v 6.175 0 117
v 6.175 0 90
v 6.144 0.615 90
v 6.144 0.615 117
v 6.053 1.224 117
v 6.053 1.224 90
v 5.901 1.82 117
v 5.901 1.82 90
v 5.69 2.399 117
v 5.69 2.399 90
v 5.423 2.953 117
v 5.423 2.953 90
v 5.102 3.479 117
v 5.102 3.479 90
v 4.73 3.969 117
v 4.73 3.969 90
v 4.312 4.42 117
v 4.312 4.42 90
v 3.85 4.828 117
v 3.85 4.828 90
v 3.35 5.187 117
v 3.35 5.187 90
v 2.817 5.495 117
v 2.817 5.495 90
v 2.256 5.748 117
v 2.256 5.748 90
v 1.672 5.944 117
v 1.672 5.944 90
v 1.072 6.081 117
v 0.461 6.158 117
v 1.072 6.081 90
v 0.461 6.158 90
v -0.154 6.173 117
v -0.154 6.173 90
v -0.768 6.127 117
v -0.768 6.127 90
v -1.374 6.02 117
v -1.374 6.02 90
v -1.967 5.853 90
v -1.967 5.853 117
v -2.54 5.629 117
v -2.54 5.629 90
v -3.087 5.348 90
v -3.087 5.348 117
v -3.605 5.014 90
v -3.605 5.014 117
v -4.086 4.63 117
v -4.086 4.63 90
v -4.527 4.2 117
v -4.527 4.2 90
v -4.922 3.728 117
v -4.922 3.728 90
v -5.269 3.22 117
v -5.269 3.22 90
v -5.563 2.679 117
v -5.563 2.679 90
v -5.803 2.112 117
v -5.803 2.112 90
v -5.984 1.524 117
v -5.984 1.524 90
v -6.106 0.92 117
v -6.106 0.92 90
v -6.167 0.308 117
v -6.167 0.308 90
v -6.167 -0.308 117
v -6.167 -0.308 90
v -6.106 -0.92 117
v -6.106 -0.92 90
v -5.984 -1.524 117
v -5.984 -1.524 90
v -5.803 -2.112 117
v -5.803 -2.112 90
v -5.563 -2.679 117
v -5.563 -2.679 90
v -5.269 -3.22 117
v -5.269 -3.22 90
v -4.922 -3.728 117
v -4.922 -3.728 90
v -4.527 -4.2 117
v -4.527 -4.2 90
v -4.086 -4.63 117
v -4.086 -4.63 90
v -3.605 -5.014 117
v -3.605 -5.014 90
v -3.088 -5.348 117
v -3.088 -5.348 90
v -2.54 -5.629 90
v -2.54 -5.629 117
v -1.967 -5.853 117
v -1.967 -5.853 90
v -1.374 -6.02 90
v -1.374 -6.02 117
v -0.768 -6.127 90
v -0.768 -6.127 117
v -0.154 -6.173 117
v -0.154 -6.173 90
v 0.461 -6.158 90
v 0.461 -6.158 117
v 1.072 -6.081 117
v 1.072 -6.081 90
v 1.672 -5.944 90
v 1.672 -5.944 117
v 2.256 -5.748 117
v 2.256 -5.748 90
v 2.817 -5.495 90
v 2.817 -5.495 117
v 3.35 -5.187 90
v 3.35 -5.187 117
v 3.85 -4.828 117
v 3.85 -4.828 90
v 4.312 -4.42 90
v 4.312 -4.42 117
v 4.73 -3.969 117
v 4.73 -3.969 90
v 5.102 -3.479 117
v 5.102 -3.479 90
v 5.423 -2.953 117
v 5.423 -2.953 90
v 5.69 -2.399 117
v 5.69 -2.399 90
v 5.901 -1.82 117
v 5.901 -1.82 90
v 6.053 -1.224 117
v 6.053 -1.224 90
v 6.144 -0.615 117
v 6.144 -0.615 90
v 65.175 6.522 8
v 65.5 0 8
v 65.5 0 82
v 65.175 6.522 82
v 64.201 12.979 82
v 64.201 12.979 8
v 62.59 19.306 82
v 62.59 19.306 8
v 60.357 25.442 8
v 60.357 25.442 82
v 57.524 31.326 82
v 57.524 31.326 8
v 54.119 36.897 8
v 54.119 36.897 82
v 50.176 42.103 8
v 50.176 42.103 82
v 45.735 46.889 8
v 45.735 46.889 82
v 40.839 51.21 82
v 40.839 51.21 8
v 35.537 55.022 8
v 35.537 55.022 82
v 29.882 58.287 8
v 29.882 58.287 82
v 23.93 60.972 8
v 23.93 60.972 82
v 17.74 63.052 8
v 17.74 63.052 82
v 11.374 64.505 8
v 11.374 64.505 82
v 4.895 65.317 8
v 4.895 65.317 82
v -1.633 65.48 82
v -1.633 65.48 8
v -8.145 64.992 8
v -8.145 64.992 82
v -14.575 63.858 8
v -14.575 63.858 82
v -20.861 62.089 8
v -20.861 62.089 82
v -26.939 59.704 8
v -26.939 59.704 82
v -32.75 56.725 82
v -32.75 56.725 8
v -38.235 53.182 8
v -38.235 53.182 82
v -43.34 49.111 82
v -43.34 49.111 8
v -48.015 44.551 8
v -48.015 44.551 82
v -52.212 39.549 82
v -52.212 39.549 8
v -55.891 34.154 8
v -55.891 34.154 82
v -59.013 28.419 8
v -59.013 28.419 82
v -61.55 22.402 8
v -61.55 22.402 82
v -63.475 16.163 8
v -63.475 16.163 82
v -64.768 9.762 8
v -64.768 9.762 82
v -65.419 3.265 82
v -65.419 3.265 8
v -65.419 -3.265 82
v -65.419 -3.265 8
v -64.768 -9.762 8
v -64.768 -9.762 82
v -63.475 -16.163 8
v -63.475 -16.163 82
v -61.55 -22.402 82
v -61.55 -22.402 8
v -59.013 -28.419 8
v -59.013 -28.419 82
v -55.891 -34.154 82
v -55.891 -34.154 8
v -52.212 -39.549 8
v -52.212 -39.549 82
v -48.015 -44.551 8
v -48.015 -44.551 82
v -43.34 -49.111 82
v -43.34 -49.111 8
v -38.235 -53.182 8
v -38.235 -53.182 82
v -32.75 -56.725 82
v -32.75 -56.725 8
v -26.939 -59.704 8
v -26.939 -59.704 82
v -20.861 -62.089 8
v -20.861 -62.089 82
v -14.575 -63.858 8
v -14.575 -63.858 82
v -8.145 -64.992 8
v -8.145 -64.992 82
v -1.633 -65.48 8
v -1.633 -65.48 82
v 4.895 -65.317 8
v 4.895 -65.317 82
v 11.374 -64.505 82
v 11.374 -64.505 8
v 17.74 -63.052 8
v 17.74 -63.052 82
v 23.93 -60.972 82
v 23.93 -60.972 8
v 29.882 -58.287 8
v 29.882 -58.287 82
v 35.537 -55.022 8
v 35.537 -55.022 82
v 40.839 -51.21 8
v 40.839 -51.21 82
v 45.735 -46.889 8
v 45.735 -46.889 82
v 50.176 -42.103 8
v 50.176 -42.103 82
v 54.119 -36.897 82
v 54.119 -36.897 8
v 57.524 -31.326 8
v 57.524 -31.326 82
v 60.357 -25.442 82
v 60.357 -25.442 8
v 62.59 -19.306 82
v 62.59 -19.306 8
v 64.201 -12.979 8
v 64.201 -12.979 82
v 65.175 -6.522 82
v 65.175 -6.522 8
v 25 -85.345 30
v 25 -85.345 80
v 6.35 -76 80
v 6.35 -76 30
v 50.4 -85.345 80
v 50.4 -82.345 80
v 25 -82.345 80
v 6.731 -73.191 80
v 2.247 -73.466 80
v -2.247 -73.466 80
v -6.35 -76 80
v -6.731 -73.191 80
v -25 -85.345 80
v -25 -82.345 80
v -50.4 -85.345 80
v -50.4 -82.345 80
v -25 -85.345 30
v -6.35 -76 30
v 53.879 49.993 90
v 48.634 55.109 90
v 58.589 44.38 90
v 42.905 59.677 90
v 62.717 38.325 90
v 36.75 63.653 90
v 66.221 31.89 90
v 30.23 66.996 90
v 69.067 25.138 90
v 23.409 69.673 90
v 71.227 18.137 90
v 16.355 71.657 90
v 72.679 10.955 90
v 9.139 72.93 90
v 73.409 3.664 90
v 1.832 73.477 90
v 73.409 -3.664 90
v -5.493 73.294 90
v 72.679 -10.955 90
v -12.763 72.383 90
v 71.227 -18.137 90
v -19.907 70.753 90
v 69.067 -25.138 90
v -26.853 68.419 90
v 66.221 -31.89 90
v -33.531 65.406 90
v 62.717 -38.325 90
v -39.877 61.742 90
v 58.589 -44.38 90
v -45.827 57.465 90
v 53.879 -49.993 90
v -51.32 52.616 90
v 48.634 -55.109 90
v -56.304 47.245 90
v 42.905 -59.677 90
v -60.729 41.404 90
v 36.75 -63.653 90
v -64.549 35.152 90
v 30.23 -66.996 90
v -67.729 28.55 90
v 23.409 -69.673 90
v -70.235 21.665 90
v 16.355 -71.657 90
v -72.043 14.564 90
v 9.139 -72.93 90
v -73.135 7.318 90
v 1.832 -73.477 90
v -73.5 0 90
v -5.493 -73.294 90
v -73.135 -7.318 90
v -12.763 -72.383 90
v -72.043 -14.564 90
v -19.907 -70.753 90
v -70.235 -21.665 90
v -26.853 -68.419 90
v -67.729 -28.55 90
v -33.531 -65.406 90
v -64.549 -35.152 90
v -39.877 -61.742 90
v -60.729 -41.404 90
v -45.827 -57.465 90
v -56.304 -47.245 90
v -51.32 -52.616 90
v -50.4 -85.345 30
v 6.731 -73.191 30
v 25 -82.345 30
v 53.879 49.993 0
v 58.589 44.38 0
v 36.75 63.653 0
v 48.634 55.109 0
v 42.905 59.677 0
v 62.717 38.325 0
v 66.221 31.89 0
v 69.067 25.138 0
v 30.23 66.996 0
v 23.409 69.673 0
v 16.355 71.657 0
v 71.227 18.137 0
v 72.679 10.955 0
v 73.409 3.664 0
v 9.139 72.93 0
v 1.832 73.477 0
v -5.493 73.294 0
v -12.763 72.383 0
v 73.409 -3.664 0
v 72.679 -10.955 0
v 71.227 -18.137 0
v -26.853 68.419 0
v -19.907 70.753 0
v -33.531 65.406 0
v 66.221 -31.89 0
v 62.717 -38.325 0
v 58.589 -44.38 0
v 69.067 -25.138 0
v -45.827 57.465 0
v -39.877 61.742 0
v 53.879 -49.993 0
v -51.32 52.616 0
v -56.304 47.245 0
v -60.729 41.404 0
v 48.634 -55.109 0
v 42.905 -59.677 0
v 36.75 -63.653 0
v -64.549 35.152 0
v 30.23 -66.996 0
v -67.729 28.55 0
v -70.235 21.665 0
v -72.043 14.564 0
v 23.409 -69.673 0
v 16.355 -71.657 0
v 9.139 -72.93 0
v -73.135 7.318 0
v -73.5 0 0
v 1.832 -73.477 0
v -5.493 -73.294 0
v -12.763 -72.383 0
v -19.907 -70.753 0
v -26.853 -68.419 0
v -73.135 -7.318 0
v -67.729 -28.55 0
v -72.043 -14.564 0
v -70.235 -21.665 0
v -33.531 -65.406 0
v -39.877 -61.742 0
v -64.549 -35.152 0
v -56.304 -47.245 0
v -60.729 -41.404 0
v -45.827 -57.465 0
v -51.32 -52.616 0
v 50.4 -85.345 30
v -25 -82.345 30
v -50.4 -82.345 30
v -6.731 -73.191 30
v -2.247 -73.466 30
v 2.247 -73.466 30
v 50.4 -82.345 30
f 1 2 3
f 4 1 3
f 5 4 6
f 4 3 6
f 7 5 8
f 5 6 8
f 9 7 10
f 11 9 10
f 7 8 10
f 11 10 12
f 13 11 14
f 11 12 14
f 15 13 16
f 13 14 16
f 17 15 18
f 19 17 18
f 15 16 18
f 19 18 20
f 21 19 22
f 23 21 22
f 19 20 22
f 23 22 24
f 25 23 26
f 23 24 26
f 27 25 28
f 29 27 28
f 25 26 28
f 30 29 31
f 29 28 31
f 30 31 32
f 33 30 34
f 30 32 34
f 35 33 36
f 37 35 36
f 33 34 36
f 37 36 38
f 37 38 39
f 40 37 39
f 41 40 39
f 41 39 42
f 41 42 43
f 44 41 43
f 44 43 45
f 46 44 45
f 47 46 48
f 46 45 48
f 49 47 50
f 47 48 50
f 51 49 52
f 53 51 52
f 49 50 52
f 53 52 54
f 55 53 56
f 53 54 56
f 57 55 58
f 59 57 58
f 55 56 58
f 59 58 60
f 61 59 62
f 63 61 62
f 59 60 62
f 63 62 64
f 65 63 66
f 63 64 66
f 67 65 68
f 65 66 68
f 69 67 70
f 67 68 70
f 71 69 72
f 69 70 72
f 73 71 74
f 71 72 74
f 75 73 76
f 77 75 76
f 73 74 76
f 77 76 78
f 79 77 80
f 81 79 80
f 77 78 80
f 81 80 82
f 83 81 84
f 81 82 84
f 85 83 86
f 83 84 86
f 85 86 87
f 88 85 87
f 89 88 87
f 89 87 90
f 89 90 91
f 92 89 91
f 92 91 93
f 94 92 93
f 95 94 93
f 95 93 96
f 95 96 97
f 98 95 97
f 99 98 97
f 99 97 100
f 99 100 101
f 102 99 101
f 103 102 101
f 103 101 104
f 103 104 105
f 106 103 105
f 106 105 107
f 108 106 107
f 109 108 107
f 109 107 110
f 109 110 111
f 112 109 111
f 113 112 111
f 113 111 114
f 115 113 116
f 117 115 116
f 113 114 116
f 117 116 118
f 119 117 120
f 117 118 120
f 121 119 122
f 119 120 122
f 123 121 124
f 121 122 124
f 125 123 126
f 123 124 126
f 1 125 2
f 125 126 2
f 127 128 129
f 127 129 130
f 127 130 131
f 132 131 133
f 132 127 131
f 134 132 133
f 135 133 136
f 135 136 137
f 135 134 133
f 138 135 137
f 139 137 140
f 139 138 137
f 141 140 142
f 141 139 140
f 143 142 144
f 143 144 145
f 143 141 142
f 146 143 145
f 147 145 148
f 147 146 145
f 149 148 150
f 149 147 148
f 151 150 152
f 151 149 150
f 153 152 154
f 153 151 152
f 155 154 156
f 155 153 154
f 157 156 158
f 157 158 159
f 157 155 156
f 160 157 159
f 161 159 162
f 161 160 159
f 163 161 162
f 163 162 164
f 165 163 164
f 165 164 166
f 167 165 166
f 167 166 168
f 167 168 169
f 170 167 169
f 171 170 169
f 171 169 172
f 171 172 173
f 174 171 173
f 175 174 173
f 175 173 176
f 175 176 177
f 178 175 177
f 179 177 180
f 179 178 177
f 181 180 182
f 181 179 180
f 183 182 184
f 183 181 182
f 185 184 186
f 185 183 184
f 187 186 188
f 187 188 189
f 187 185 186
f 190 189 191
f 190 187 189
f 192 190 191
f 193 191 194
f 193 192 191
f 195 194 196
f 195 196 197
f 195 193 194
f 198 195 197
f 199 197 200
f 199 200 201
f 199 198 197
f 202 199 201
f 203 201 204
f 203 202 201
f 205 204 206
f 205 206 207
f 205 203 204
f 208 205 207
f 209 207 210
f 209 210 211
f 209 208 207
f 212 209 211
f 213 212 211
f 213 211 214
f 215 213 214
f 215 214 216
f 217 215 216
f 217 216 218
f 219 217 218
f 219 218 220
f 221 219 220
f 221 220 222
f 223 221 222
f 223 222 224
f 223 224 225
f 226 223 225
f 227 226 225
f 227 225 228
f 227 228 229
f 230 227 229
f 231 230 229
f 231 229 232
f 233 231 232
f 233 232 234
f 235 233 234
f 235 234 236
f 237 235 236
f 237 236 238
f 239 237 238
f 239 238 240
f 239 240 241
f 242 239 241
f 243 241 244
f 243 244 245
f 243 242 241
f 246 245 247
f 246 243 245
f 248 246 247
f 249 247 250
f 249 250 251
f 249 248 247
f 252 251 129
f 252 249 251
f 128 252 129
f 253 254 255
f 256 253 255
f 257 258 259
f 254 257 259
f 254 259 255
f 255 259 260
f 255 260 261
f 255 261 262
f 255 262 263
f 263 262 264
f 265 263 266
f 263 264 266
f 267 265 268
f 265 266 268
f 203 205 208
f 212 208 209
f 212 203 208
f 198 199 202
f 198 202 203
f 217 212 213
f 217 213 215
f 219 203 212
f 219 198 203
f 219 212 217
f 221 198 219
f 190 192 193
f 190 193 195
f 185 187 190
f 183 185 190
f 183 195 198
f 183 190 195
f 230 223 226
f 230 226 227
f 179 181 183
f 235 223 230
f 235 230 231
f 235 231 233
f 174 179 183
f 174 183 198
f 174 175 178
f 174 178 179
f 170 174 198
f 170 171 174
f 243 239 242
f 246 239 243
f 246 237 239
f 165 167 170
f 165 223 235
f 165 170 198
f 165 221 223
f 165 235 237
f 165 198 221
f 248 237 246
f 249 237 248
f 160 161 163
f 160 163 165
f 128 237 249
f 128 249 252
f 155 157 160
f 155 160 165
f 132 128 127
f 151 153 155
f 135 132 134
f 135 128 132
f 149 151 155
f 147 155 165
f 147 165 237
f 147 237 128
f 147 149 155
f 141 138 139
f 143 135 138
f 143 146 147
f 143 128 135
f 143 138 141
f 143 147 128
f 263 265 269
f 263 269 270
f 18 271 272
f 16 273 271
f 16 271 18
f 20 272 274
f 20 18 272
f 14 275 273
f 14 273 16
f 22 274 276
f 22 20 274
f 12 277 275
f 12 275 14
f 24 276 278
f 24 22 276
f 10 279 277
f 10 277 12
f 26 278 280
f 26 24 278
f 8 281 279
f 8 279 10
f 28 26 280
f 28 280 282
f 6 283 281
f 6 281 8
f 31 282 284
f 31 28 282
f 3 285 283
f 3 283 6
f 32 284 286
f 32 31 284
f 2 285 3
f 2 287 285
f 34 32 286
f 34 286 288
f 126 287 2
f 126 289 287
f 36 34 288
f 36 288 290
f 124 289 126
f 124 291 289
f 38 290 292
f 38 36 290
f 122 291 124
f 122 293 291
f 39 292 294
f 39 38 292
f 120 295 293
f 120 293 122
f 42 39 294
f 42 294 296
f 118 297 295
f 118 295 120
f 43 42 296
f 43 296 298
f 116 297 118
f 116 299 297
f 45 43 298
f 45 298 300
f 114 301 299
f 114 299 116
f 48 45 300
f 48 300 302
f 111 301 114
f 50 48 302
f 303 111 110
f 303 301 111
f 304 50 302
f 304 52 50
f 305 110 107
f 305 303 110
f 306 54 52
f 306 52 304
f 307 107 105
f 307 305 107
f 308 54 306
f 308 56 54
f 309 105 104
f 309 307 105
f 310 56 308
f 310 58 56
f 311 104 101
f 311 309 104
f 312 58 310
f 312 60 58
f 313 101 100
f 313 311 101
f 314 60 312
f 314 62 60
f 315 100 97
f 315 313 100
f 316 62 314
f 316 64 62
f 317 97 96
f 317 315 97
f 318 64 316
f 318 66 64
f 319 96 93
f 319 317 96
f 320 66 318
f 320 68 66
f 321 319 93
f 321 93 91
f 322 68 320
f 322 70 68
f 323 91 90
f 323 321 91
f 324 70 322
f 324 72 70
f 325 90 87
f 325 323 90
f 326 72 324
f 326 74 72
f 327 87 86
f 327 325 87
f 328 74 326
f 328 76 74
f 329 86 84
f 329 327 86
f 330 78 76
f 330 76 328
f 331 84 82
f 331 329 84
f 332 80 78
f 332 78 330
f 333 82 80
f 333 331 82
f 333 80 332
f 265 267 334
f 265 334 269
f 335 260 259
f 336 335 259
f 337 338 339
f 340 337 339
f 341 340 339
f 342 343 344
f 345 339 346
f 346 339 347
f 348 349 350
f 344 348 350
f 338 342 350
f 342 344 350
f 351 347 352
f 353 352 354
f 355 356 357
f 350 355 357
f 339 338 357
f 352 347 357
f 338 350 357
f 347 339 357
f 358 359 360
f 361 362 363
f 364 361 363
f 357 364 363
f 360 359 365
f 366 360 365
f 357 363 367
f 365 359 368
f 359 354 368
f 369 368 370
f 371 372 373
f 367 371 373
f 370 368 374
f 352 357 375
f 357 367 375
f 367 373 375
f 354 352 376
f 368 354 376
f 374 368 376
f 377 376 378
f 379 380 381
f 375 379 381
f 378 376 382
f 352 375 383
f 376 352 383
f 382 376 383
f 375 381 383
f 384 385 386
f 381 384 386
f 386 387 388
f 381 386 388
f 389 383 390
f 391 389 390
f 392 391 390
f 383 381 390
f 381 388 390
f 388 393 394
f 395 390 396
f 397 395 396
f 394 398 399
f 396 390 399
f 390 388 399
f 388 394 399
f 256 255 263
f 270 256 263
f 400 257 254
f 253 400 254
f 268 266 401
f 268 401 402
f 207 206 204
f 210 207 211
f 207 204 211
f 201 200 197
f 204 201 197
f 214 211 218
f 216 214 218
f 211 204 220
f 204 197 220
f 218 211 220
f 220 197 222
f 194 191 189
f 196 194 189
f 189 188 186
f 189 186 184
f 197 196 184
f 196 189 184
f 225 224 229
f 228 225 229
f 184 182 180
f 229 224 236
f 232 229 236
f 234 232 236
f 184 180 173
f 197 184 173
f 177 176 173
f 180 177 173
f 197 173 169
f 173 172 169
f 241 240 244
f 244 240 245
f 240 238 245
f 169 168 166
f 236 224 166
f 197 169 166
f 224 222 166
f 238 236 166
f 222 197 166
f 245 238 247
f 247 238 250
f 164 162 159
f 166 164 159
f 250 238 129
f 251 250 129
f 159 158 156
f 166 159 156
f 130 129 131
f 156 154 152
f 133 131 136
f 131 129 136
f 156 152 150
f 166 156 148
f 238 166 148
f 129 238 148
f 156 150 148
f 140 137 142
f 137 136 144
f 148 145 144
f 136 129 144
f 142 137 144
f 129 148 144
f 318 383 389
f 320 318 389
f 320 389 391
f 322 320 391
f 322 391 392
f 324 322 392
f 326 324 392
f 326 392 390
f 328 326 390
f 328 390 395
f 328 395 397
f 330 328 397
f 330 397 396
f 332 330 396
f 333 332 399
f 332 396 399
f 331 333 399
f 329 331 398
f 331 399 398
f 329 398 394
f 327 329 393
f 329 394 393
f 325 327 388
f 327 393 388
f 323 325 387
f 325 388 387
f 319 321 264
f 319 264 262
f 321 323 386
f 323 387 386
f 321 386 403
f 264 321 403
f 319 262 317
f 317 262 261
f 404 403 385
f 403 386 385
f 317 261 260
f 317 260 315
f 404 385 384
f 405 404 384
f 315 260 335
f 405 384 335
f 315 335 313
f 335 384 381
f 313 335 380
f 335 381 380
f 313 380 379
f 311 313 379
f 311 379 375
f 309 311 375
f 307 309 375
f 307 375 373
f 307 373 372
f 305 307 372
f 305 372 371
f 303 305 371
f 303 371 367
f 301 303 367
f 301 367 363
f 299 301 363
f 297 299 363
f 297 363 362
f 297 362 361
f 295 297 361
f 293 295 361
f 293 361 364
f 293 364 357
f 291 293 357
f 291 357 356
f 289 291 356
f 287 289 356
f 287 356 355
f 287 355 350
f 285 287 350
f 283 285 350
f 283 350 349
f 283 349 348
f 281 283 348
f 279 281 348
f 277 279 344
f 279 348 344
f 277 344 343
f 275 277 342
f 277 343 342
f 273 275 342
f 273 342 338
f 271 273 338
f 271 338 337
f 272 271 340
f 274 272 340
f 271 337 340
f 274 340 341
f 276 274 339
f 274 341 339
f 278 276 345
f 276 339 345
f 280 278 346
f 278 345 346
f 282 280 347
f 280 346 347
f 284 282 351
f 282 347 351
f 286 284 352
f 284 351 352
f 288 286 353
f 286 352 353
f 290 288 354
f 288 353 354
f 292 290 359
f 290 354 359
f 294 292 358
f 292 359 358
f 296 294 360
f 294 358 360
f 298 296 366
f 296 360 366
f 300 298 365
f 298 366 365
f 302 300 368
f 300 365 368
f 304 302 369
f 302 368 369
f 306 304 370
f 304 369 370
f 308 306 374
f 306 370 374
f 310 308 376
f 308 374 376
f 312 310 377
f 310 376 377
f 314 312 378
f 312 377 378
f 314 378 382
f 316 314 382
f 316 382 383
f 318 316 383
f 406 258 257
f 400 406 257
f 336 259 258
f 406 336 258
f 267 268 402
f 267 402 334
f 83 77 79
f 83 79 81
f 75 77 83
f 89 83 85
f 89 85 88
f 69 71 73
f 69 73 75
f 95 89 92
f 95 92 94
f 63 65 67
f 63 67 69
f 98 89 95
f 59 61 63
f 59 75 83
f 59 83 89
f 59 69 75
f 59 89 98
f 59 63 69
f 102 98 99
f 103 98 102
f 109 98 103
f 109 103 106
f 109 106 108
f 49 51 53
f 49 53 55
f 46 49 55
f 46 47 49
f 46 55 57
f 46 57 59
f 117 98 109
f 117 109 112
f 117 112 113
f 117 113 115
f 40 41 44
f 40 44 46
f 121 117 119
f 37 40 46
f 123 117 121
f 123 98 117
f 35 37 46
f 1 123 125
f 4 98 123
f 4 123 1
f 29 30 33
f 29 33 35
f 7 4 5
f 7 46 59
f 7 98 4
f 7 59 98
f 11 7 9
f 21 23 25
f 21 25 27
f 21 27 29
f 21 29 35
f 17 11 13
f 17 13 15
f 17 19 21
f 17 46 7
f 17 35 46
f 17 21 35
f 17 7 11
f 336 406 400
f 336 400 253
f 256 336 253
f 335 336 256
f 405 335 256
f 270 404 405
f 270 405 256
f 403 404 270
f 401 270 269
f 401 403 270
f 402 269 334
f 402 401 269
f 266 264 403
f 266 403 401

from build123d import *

# Parameters (mm, degrees)
SKETCH1_R           = 73.5
BOSS_EXTRUDE1_DEPTH = 90
SKETCH2_R           = 6.175
BOSS_EXTRUDE2_DEPTH = 27
BOSS_EXTRUDE3_DEPTH = 50
SHELL1_START        = 8
SHELL1_OUTLINE_R    = 65.5
SHELL1_DEPTH        = 74


# Read off the part's stored shape, not the designer's step: Shell1
with BuildPart() as part:
    # Sketch1 → Boss-Extrude1 (new body)
    with BuildSketch(Plane.XY):
        with Locations(Location((0, 0, 0), (0, 0, 180))):
            Circle(SKETCH1_R)
    extrude(amount=BOSS_EXTRUDE1_DEPTH)

    # Sketch2 → Boss-Extrude2 (add)
    with BuildSketch(Plane.XY.offset(90)):
        Circle(SKETCH2_R)
    extrude(amount=BOSS_EXTRUDE2_DEPTH)

    # Sketch3 → Boss-Extrude3 (add)
    with BuildSketch(Plane.XY.offset(80)):
        Polygon((-50.4, -85.345), (-25, -85.345), (-6.35, -76), (0, -76), (0, -73), (-6.35, -73), (-25, -82.345), (-50.4, -82.345), align=None)
    boss_extrude3 = extrude(amount=-BOSS_EXTRUDE3_DEPTH)

    # Mirror1: Boss-Extrude3 across plane
    add(boss_extrude3.mirror(Plane(origin=(0, 0, 0), x_dir=(0, 0, 1), z_dir=(1, 0, 0))))

    # Shell1 outline → Shell1 (cut)
    with BuildSketch(Plane.XY.offset(SHELL1_START)):
        Circle(SHELL1_OUTLINE_R)
    extrude(amount=SHELL1_DEPTH, mode=Mode.SUBTRACT)


solid = part.part
